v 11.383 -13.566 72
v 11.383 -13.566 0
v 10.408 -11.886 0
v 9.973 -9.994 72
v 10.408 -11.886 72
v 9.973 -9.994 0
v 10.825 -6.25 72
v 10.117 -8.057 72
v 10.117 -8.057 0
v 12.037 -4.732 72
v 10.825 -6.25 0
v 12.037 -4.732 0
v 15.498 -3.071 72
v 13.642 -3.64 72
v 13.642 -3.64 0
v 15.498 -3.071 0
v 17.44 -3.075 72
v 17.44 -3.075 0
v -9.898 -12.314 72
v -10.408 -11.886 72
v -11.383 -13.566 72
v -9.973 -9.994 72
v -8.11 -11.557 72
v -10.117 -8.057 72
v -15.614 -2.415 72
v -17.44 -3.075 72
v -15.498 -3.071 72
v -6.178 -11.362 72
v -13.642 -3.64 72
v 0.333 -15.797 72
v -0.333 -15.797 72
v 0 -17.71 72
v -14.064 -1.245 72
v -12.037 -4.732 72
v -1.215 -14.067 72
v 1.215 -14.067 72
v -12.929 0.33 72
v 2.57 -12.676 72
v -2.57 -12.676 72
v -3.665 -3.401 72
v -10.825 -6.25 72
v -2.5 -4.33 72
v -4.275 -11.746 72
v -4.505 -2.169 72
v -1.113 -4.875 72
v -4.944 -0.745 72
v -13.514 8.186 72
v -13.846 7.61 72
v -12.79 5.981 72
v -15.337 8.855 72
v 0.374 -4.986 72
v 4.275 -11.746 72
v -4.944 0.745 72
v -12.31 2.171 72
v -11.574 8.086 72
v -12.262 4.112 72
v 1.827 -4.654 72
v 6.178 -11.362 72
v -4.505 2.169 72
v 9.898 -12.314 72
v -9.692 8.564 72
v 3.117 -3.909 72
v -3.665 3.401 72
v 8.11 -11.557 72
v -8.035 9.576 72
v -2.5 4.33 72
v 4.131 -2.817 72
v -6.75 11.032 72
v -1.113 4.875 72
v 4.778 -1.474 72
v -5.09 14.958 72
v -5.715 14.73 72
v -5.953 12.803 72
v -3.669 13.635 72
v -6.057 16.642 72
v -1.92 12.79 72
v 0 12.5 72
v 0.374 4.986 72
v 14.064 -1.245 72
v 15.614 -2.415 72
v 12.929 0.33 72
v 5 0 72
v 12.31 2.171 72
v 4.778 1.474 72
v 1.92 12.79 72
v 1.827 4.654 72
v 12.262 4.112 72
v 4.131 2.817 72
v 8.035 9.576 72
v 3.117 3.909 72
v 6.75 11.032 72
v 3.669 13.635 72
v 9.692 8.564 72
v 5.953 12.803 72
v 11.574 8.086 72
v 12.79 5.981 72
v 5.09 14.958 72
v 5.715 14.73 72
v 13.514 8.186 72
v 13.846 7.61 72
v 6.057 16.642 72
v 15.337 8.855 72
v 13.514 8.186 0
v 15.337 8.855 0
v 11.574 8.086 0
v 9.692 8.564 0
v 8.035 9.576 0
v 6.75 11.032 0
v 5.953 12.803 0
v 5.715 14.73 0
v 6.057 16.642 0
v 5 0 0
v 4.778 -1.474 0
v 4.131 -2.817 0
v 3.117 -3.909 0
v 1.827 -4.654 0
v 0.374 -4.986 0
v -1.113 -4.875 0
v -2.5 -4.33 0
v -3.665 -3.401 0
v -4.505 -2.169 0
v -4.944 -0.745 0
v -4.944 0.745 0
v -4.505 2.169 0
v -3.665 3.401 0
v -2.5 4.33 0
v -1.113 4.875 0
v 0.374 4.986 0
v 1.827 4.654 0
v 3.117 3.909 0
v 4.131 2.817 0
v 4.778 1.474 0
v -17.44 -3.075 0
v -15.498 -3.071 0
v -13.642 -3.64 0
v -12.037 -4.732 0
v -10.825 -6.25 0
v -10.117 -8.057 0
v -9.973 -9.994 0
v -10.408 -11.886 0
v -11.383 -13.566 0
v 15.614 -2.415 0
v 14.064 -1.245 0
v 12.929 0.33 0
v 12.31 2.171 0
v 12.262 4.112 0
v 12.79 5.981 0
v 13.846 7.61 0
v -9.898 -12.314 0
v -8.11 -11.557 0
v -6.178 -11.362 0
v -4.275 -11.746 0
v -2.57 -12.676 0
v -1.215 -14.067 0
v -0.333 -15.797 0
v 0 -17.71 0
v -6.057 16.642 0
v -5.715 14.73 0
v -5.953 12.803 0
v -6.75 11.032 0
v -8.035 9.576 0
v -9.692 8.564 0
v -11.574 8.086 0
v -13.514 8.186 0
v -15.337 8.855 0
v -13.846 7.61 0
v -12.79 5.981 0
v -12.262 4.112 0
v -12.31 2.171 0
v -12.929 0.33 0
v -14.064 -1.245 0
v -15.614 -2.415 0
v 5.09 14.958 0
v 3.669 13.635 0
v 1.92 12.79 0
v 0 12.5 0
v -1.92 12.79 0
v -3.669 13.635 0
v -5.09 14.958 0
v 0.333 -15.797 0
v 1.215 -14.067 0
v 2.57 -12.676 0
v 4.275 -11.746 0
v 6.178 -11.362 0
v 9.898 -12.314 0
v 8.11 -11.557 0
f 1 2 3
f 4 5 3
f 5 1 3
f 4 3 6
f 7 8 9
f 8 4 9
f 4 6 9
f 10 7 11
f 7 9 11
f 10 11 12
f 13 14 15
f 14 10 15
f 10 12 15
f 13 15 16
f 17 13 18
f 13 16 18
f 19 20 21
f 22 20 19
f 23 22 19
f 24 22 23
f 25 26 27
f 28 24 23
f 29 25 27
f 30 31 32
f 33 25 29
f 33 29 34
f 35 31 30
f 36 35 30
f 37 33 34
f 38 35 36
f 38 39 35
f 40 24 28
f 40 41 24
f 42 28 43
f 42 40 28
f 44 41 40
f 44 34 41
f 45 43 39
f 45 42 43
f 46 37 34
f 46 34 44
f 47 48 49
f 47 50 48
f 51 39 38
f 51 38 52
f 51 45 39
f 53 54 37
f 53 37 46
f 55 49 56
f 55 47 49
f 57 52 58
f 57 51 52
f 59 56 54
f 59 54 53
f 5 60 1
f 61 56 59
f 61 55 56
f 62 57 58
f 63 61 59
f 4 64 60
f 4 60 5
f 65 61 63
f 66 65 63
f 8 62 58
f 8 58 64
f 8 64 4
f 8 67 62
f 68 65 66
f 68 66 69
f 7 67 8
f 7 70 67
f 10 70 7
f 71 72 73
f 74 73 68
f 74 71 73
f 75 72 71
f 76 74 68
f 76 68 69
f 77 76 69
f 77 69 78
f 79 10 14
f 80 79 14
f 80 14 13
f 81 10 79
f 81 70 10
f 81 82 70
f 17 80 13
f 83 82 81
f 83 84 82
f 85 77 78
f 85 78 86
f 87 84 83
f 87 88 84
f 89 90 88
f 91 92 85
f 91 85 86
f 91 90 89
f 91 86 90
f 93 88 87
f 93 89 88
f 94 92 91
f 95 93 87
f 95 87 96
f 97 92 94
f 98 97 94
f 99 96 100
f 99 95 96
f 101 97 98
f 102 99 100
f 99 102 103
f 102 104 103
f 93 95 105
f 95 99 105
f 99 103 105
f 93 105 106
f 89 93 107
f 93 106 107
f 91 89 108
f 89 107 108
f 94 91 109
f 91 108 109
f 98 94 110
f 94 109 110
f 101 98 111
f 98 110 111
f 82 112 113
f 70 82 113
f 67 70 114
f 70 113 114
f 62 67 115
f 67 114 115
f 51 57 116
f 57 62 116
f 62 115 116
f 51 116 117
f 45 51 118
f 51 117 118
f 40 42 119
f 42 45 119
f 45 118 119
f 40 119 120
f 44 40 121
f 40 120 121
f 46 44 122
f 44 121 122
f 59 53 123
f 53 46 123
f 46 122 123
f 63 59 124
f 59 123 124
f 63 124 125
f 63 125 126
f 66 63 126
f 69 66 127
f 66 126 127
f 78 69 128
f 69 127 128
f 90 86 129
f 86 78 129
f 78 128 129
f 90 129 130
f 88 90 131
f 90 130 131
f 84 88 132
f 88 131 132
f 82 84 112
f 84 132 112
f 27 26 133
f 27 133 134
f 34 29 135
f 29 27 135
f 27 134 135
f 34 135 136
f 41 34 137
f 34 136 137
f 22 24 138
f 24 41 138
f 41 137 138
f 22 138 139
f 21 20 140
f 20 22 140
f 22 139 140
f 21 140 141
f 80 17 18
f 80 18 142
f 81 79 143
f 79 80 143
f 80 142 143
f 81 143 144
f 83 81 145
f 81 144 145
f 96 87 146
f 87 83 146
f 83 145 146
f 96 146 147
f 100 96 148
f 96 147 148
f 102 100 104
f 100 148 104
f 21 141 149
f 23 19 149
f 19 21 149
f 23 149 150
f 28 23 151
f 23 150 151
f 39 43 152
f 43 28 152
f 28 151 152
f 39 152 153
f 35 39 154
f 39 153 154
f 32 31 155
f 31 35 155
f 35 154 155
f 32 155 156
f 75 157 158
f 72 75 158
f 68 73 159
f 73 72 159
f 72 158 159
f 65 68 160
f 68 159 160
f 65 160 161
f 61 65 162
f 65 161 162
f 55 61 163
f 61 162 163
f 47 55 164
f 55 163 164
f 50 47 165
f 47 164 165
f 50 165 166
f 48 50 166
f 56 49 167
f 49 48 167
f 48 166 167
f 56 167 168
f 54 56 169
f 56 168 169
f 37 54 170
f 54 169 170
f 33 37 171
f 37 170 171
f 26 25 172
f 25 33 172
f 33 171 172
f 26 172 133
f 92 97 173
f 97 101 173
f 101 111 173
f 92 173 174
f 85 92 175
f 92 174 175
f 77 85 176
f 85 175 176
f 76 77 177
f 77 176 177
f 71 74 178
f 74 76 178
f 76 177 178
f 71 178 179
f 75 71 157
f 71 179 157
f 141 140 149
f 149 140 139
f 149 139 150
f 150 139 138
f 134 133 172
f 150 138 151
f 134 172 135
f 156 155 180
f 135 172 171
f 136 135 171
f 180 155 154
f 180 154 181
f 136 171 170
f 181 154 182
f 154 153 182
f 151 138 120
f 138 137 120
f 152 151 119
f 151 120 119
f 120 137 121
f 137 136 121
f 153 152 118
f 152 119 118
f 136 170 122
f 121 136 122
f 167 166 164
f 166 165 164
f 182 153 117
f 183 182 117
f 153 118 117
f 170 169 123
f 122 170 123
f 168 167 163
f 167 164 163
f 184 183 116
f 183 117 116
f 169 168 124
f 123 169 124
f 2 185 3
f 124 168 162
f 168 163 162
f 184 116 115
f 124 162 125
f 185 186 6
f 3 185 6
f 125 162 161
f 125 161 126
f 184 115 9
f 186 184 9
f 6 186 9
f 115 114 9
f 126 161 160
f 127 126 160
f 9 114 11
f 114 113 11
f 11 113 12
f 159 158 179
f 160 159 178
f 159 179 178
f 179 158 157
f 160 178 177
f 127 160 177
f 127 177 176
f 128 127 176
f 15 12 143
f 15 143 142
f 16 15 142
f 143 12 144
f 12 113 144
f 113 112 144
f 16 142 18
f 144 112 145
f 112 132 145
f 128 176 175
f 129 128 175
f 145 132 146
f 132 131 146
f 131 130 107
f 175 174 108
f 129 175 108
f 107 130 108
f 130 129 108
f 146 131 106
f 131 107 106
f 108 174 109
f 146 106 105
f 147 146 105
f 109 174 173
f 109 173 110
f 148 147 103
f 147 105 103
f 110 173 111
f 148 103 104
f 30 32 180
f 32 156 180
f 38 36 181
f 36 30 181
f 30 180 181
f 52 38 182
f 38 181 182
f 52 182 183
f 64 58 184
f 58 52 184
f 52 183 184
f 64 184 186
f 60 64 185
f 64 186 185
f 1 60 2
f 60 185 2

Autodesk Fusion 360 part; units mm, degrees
sketch "Sketch1" plane through (0, 0, 0) normal (0, 0, 1) x (1, 0, 0)
  line L0 (-6.1079, 16.7767) -> (-6.1049, 16.7778)
  line L1 (-15.4628, 8.9256) -> (-15.4612, 8.9284)
  line L2 (-17.5825, -3.1019) -> (-17.583, -3.0987)
  line L3 (-11.4751, -13.678) -> (-11.4776, -13.6759)
  line L4 (0.0016, -17.854) -> (-0.0016, -17.854)
  line L5 (11.4776, -13.6759) -> (11.4751, -13.678)
  line L6 (17.583, -3.0987) -> (17.5825, -3.1019)
  line L7 (15.4612, 8.9284) -> (15.4628, 8.9256)
  line L8 (6.1049, 16.7778) -> (6.1079, 16.7767)
  circle A0 centre (0, 0) radius 5
  arc A1 (-6.1079, 16.7767) -> (6.1079, 16.7767) centre (0, 19) ccw
  arc A2 (-15.4628, 8.9256) -> (-6.1049, 16.7778) centre (-12.213, 14.5548) ccw
  arc A3 (-17.5825, -3.1019) -> (-15.4612, 8.9284) centre (-18.7113, 3.2993) ccw
  arc A4 (-11.4751, -13.678) -> (-17.583, -3.0987) centre (-16.4545, -9.5) ccw
  arc A5 (0.0016, -17.854) -> (-11.4776, -13.6759) centre (-6.4984, -17.8542) ccw
  arc A6 (11.4776, -13.6759) -> (-0.0016, -17.854) centre (6.4984, -17.8542) ccw
  arc A7 (17.583, -3.0987) -> (11.4751, -13.678) centre (16.4545, -9.5) ccw
  arc A8 (15.4612, 8.9284) -> (17.5825, -3.1019) centre (18.7113, 3.2993) ccw
  arc A9 (6.1049, 16.7778) -> (15.4628, 8.9256) centre (12.213, 14.5548) ccw
  dimension "d1" = 19
  dimension "d2" = 10
  dimension "d3" = 13
  dimension "d5" = 360
extrude "Extrude1" add sketch "Sketch1" along normal blind 72 contours A1 A2 A3 A4 A5 A6 A7 A8 A9
